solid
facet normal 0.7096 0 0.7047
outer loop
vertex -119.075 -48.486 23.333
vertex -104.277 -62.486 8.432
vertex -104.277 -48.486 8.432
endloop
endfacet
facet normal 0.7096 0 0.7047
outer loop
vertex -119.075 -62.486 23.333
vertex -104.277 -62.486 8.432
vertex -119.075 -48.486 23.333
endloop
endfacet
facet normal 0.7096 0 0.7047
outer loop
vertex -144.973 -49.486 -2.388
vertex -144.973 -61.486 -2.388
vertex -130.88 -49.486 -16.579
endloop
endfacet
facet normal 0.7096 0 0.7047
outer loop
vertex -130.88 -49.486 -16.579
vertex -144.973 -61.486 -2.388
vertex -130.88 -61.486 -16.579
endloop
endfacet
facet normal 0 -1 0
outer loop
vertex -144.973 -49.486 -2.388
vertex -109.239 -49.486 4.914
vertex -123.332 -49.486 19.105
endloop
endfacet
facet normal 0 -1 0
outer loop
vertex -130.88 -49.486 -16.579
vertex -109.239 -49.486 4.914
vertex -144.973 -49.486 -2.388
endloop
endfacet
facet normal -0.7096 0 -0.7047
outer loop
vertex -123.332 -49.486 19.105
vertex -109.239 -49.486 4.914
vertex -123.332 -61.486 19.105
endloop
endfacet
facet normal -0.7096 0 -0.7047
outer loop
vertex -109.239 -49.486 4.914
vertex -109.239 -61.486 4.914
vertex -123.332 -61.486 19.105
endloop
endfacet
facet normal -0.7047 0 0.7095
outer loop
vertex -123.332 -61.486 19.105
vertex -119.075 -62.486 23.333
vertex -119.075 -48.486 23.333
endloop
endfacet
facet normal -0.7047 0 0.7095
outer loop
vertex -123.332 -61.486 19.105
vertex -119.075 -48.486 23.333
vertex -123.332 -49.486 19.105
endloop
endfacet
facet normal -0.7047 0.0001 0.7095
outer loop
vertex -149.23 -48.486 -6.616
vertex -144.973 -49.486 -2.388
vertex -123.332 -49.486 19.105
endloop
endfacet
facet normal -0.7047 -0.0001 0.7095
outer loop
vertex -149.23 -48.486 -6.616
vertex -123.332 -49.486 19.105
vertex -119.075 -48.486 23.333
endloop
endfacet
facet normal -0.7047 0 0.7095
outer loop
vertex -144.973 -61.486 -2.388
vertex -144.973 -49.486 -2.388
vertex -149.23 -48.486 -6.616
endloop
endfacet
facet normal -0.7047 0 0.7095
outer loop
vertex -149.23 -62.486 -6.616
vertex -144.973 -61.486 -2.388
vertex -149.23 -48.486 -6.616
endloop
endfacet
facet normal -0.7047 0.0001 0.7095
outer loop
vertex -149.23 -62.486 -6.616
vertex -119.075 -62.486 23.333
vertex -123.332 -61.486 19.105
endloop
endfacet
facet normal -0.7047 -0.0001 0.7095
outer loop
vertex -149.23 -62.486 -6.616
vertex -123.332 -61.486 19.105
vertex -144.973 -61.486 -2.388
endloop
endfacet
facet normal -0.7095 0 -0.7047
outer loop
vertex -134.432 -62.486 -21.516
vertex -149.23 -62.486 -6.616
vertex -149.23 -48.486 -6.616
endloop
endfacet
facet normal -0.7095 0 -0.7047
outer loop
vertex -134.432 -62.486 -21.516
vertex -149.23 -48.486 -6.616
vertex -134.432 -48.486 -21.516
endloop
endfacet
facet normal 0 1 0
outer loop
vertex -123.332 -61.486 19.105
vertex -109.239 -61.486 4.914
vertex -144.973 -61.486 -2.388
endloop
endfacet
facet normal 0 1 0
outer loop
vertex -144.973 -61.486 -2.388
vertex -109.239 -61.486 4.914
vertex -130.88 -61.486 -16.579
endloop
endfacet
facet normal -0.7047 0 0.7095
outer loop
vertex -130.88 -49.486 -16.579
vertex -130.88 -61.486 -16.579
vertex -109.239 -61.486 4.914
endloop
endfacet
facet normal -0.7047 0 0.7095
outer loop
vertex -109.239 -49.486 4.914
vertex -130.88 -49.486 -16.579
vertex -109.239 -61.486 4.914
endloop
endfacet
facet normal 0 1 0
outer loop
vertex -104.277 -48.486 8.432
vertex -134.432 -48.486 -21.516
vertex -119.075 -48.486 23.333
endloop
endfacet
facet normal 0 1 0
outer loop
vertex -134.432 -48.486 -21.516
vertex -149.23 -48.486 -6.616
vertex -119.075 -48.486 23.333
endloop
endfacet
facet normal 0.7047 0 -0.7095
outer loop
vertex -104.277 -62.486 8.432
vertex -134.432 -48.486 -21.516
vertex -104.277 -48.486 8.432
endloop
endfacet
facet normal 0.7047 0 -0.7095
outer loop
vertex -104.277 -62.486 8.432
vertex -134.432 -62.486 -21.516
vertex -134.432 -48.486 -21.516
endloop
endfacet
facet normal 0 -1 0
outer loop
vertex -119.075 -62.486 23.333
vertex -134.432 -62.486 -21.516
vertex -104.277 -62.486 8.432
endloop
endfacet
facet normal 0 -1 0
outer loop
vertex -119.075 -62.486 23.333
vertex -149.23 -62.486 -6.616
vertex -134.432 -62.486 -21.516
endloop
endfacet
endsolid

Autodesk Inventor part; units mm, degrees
ref_plane "YZ Plane" through (0, 0, 0) normal (1, 0, 0) x (0, 1, 0)
ref_plane "XZ Plane" through (0, 0, 0) normal (0, 1, 0) x (-1, 0, 0)
ref_plane "XY Plane" through (0, 0, 0) normal (0, 0, 1) x (1, 0, 0)
ref_plane "Work Plane1" through (-120.5056, -67.4861, 19.6827) normal (0, -1, 0) x (-0.7095338, 0, -0.7046714)
sketch "Sketch1" plane through (-120.5056, -67.4861, 19.6827) normal (0, -1, 0) x (-0.7095338, 0, -0.7046714)
  line L0 (-3.5869, -1.5817) -> (38.9131, -1.5817)
  line L1 (38.9131, -1.5817) -> (38.9131, 24.4183)
  line L2 (38.9131, 24.4183) -> (-3.5869, 24.4183)
  line L3 (-3.5869, 24.4183) -> (-3.5869, -1.5817)
  point P0 (-71.6329, 98.8824)
  dimension "d0" = 42.5
  dimension "d1" = 26
extrude "Extrusion1" add sketch "Sketch1" against normal blind 24
shell "Shell1" thickness 6 removed faces 1 at (-129.1269, -59.4861, 13.3497)
sketch "Sketch2" plane through (-119.0751, -67.4861, 23.3326) normal (-0.7046714, 0, 0.7095338) x (0.7095338, 0, 0.7046714)
  line L0 (0, 0) -> (-42.5, 0) projected
  line L1 (-42.5, 0) -> (-42.5, 24) projected
  line L2 (0, 0) -> (-42.5, 0)
  line L3 (-42.5, 0) -> (-42.5, 5)
  line L4 (-42.5, 5) -> (0, 5)
  line L5 (0, 5) -> (0, 0)
  line L6 (0, 24) -> (-42.5, 24)
  line L7 (-42.5, 24) -> (-42.5, 19)
  line L8 (-42.5, 19) -> (0, 19)
  line L9 (0, 19) -> (0, 24)
  point P0 (68.046, 67.4861)
  dimension "d5" = 5
  dimension "d7" = 5
extrude "Extrusion2" cut sketch "Sketch2" against normal through all
sketch "Sketch3" plane through (-119.0751, -62.4861, 23.3326) normal (0, -1, 0) x (-0.7095338, 0, -0.7046714)
  line L0 (42.5, 26) -> (42.5, 0) projected
  line L1 (0, 26) -> (42.5, 26)
  line L2 (42.5, 26) -> (42.5, 21)
  line L3 (42.5, 21) -> (0, 21)
  line L4 (0, 21) -> (0, 26)
  point P0 (-68.046, 100.4641)
  dimension "d10" = 5
extrude "Extrusion3" cut sketch "Sketch3" against normal through all
properties part number "ServoHolder"
